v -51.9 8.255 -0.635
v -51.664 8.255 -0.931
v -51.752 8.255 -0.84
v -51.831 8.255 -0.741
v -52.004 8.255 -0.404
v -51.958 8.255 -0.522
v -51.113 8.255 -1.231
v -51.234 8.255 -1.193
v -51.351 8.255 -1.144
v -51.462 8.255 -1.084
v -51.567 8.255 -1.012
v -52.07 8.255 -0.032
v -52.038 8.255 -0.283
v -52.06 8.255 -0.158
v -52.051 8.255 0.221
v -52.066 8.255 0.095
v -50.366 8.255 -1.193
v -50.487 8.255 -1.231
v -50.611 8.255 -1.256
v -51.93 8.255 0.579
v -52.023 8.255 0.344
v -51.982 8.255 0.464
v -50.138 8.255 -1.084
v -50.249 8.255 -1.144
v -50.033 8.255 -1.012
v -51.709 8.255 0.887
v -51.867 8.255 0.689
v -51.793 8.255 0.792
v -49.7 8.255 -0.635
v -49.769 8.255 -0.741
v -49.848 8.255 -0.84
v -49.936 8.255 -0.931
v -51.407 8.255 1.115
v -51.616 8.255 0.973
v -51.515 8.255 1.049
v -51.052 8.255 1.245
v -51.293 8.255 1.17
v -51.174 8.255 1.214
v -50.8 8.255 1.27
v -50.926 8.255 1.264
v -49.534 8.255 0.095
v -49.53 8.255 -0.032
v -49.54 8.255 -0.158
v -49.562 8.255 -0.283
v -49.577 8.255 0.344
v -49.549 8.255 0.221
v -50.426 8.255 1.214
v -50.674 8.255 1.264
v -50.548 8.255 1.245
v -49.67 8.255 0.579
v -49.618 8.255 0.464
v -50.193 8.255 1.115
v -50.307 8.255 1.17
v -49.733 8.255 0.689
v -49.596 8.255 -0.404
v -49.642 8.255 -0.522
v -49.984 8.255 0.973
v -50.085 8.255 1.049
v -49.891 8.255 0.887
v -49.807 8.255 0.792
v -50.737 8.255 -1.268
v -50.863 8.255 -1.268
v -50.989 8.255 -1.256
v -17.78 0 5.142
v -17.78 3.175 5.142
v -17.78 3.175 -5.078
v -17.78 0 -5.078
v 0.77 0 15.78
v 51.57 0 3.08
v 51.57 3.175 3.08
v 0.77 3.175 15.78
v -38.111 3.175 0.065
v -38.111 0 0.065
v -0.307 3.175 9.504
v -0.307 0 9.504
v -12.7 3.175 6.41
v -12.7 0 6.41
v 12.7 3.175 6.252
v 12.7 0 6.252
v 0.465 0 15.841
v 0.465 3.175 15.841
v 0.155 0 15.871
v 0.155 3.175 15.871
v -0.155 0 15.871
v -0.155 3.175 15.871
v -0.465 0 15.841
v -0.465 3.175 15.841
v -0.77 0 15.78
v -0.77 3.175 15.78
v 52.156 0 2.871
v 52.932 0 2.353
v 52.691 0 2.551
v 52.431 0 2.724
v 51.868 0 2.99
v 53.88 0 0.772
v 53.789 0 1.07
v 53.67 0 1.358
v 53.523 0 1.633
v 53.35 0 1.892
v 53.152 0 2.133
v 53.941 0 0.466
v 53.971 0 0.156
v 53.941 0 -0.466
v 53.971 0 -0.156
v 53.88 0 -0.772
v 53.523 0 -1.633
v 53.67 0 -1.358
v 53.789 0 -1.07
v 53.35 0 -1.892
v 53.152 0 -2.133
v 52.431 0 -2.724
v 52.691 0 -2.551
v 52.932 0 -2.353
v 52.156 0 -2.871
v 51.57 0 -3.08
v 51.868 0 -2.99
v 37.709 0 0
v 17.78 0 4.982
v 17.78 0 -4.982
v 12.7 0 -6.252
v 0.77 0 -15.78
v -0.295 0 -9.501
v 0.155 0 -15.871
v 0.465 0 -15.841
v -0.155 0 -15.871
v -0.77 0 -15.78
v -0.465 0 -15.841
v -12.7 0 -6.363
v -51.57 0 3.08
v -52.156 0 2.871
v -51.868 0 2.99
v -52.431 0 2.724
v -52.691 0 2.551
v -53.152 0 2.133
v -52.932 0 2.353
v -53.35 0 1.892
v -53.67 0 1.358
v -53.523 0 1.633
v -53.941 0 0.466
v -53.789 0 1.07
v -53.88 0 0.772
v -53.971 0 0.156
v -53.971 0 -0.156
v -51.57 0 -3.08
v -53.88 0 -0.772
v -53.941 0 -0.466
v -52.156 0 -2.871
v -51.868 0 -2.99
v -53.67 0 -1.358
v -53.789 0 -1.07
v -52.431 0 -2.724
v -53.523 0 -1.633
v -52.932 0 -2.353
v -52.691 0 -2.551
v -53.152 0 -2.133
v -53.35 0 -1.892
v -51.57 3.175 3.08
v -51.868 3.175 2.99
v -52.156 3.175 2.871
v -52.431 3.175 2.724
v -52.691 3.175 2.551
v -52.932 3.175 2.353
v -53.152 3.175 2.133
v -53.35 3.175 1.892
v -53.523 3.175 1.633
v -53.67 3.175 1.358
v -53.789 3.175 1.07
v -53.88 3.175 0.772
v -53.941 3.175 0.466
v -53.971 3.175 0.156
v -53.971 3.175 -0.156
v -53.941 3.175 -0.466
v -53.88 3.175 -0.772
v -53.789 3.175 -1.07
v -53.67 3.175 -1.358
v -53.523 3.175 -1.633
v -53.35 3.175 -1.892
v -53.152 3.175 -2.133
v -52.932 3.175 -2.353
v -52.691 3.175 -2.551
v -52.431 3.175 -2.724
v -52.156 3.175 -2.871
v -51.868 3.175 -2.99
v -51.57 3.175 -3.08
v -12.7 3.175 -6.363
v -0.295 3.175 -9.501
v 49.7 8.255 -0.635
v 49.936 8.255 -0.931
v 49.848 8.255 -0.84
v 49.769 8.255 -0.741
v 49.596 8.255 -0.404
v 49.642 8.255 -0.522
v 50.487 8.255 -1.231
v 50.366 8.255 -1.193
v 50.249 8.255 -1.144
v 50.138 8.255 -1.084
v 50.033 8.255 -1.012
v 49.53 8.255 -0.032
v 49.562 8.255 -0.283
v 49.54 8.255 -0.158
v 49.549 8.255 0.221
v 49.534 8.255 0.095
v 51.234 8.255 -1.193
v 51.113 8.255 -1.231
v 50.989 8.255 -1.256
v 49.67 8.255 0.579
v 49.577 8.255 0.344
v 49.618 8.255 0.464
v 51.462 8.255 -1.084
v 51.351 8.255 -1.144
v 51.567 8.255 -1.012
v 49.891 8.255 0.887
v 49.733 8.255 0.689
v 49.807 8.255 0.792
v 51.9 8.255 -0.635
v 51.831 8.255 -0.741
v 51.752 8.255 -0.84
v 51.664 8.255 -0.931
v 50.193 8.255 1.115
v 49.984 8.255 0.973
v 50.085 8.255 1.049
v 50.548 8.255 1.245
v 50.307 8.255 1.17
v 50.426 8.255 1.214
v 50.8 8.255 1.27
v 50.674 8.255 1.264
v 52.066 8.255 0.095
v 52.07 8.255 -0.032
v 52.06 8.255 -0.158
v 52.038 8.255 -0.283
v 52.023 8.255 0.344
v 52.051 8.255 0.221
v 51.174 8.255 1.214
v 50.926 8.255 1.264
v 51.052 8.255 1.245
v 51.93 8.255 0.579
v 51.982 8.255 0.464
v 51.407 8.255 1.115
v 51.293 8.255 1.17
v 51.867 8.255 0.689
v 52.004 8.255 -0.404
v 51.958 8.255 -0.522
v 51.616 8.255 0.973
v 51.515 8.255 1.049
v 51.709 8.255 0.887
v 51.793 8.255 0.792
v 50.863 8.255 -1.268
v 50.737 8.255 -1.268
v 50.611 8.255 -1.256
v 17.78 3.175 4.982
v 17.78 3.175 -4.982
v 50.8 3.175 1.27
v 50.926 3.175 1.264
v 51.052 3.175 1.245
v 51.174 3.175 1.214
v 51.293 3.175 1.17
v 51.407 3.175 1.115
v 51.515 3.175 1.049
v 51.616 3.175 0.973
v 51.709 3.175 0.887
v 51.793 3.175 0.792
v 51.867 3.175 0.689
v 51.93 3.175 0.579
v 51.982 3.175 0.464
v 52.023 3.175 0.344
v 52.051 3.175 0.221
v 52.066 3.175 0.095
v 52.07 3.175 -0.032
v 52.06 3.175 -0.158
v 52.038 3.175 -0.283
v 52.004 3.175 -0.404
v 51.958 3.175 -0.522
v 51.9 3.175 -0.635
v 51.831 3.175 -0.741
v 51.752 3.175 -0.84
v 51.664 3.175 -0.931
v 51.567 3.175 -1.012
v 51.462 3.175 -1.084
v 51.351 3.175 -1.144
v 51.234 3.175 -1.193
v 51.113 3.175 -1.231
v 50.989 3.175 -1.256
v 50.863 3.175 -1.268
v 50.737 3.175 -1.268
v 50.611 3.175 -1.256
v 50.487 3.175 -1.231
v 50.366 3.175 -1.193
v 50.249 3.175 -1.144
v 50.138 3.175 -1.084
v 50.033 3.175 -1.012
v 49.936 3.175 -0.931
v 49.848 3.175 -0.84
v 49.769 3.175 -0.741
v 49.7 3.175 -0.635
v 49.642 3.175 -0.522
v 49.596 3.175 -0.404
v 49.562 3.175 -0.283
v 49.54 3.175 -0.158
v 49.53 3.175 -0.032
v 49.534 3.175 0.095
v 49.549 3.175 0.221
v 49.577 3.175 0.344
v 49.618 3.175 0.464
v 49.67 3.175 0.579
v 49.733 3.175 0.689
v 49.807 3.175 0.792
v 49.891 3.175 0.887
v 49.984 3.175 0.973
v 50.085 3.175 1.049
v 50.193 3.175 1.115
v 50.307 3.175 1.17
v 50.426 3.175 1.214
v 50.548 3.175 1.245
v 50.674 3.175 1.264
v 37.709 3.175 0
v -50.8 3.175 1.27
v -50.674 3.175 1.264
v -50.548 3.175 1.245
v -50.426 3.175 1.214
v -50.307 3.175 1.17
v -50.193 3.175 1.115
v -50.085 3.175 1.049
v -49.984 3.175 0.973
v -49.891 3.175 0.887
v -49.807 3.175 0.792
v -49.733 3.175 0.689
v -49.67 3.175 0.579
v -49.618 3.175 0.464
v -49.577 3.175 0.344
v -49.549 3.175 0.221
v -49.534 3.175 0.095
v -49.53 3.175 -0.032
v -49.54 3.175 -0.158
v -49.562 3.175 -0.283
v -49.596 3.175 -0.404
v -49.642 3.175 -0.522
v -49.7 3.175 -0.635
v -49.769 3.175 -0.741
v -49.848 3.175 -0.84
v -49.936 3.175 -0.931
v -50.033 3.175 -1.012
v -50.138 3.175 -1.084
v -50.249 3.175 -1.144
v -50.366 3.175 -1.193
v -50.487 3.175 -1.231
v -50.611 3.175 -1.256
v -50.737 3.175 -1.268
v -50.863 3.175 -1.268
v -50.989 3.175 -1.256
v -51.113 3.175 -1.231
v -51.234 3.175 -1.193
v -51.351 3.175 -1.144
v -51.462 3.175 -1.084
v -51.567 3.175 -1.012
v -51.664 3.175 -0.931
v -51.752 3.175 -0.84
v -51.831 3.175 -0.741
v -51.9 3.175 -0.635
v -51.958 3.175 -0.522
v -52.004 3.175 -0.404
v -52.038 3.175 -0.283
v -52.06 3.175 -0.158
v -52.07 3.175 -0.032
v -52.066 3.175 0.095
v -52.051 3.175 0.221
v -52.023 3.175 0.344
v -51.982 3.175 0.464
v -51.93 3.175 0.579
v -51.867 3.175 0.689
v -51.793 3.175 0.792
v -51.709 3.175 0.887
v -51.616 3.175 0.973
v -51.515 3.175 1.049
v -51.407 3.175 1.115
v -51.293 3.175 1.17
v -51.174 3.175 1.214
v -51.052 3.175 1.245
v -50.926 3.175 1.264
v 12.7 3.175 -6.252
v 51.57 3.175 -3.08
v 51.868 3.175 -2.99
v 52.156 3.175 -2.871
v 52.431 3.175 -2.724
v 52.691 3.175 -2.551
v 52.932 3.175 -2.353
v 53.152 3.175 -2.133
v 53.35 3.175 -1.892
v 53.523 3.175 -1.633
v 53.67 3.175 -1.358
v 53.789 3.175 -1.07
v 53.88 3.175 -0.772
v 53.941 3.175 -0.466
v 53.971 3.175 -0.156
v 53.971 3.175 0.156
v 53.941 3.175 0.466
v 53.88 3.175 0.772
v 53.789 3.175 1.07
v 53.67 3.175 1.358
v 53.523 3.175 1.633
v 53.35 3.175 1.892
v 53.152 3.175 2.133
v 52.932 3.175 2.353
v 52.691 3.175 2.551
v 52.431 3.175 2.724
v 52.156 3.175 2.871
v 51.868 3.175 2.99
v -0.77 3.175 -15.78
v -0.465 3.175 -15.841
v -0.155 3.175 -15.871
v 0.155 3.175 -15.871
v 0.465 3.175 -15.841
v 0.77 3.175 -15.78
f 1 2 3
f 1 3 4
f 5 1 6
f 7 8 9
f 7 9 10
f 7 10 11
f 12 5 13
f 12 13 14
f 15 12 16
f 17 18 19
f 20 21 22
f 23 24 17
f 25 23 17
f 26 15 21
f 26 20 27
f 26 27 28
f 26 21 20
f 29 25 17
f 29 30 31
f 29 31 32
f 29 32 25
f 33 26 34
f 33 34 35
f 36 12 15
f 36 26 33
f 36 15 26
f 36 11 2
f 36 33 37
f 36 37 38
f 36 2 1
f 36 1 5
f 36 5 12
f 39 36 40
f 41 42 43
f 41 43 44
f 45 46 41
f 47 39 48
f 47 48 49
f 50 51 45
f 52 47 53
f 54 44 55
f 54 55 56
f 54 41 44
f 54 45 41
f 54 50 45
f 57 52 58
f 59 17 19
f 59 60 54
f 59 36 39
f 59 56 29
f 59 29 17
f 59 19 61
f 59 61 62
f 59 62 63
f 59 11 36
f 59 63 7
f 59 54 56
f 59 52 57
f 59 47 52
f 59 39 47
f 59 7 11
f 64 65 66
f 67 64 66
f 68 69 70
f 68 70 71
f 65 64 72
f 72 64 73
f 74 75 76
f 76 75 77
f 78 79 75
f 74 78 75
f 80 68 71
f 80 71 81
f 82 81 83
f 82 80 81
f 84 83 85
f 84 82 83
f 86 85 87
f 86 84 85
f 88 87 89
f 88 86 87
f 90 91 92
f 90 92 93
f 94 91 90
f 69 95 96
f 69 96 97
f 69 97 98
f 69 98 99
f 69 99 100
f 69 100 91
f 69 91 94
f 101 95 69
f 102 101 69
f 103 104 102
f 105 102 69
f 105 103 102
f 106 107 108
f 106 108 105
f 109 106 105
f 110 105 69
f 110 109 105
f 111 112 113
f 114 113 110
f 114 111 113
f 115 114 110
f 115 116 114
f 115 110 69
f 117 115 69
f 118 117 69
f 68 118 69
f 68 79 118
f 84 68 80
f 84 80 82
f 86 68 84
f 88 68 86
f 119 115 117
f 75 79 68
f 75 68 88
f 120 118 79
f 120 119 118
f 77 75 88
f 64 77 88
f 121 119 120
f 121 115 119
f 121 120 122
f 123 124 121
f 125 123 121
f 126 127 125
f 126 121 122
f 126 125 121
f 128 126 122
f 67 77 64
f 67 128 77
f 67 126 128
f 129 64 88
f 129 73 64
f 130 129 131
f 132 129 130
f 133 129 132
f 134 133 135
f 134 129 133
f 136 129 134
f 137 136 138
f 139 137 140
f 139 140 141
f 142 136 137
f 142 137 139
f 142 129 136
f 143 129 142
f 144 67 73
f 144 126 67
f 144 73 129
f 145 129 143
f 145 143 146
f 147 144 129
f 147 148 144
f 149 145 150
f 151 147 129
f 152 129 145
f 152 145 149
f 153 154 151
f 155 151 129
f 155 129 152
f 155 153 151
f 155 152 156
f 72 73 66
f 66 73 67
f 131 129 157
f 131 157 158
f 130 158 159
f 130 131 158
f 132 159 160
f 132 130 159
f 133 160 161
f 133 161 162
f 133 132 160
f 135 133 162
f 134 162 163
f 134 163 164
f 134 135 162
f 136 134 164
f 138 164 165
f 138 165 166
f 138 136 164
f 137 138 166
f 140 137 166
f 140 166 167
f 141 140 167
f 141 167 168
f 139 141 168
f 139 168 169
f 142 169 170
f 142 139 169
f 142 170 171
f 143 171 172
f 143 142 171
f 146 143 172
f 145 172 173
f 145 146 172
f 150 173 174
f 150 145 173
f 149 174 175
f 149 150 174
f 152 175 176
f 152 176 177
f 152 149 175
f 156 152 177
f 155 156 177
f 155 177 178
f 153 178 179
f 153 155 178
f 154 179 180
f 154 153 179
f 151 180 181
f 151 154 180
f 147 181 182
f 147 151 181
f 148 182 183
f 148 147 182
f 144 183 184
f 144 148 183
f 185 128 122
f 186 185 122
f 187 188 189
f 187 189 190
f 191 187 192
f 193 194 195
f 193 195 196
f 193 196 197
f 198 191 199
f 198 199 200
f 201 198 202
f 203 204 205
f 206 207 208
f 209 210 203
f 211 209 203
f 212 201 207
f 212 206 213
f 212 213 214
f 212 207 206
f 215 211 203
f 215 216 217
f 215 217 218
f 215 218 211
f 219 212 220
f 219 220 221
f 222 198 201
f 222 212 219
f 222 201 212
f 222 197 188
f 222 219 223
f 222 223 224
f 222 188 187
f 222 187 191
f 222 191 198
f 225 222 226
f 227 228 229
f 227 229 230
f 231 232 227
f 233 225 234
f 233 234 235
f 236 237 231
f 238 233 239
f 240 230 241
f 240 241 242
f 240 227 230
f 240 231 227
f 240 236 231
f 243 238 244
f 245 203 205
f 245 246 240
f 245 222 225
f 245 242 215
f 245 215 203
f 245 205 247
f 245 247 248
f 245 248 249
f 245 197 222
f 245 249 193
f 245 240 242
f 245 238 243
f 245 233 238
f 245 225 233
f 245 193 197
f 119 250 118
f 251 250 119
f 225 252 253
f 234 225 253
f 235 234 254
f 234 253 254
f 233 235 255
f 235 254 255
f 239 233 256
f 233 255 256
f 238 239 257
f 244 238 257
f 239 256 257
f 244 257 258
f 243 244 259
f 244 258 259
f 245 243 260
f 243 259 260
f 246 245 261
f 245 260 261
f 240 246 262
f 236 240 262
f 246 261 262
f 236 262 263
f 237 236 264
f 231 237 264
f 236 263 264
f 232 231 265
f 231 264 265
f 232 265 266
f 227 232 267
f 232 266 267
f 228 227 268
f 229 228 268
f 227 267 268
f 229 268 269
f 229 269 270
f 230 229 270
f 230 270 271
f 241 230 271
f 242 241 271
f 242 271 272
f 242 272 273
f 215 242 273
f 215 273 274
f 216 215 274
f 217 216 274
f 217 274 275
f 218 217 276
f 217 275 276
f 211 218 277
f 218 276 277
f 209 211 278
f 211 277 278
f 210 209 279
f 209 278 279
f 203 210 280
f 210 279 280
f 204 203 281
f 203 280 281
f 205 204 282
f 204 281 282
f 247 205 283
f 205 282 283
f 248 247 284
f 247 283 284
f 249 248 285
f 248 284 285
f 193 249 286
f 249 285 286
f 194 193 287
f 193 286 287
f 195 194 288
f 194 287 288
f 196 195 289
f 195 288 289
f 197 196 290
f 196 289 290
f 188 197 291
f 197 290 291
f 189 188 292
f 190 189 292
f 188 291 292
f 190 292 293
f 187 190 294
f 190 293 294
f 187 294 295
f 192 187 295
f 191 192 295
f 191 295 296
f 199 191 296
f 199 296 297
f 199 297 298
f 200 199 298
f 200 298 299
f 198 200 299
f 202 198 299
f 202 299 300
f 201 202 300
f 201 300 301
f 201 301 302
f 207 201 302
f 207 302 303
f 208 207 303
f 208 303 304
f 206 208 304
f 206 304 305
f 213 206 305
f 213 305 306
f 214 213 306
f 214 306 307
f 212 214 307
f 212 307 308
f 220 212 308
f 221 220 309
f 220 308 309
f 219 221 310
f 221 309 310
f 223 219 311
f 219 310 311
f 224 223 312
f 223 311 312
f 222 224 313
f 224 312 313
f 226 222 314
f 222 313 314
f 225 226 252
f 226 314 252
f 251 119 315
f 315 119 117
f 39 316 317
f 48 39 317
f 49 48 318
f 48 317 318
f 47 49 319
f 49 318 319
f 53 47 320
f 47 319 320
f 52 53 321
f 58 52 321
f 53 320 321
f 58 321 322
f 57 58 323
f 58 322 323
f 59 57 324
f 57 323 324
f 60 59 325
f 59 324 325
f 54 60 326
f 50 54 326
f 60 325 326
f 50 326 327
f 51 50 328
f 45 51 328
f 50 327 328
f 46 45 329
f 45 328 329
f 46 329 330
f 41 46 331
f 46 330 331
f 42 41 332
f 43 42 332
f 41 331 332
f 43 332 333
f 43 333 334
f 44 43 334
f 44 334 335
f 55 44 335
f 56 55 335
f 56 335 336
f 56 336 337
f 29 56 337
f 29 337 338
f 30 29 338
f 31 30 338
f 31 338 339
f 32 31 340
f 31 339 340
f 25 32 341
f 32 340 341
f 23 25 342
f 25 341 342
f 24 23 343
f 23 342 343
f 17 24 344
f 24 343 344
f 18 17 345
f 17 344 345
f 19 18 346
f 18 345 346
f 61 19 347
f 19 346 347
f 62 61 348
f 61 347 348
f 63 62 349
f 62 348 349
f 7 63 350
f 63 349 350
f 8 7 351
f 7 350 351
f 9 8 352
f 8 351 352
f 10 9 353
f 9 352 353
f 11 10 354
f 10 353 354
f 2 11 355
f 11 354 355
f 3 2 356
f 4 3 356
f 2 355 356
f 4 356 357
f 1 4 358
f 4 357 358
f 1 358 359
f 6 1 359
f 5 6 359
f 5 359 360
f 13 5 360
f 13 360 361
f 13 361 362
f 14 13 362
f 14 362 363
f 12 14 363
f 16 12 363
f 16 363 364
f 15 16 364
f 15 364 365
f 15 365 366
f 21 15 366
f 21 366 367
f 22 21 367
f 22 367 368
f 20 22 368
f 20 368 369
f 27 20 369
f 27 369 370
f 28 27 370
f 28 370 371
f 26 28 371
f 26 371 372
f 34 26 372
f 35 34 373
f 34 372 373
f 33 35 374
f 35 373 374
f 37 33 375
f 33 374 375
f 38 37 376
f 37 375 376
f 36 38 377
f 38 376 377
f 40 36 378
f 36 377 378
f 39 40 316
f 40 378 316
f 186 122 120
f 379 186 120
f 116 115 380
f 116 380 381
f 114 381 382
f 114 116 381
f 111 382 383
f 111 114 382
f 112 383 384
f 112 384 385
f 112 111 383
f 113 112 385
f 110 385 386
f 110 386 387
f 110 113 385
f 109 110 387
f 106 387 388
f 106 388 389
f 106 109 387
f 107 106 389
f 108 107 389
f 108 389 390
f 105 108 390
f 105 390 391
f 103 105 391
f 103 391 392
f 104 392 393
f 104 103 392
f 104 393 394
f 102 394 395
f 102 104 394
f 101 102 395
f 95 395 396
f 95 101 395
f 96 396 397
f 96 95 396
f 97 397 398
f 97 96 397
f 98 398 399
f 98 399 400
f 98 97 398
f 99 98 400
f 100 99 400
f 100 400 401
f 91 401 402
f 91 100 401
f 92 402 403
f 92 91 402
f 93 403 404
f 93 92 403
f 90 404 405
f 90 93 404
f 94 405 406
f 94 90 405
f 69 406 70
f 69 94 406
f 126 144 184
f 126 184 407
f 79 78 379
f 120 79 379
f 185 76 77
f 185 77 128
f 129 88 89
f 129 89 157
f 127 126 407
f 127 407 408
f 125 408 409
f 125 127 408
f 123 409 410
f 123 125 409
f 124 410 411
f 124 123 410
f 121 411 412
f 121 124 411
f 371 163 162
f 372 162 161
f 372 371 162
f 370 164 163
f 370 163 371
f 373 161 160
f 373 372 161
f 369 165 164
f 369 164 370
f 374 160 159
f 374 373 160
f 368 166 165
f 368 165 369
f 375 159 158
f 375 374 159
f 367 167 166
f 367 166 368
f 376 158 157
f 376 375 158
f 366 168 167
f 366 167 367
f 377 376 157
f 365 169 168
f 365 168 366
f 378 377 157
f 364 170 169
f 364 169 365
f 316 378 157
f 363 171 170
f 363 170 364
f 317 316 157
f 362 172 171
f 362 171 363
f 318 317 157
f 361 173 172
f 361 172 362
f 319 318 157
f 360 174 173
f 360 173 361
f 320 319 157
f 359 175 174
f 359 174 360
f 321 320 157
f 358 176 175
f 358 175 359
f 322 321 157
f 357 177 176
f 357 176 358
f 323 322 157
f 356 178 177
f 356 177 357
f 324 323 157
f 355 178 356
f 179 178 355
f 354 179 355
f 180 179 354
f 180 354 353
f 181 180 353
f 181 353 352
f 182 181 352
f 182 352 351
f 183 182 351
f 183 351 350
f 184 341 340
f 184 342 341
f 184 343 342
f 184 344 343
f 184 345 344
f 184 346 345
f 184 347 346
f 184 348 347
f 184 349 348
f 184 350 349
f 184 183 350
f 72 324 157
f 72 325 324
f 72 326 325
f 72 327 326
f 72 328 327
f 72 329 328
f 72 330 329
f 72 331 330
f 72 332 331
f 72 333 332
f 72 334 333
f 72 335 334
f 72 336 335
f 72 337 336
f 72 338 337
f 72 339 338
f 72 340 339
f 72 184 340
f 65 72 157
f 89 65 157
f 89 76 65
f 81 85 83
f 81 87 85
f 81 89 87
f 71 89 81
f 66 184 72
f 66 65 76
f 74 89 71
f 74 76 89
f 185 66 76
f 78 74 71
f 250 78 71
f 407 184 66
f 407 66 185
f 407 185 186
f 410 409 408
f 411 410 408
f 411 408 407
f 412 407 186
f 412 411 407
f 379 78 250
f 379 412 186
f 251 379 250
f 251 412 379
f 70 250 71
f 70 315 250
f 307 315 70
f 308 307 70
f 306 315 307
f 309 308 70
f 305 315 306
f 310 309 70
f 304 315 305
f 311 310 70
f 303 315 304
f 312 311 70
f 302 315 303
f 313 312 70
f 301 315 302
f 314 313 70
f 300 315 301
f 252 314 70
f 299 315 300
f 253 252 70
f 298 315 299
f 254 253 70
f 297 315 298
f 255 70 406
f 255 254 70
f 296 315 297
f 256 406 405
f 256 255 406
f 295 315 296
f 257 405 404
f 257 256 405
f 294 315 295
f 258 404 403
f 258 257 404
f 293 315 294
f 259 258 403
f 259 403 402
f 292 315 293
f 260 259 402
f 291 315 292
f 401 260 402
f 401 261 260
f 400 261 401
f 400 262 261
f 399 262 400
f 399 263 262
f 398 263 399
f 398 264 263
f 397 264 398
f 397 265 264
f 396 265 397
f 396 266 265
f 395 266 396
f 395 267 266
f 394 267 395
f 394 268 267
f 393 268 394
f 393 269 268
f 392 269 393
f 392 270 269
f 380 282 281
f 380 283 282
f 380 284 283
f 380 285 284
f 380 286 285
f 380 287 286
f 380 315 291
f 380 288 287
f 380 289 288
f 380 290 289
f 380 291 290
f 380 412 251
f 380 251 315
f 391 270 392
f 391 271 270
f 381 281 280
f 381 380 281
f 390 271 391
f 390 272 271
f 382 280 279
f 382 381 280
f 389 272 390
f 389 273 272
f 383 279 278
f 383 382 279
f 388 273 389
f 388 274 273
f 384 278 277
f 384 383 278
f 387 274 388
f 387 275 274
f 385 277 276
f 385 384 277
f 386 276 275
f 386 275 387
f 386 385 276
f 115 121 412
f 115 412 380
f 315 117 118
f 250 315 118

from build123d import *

# Parameters (mm, degrees)
BOSS_EXTRUDE1_DEPTH = 3.175
SKETCH5_R           = 1.27
BOSS_EXTRUDE2_DEPTH = 5.08
SKETCH6_R           = 1.27
BOSS_EXTRUDE3_DEPTH = 5.08
SKETCH10_W          = 5.08
SKETCH10_H          = 16.51
BOSS_EXTRUDE6_DEPTH = 3.175


with BuildPart() as part:
    # Sketch2 → Boss-Extrude1 (new body)
    with BuildSketch(Plane(origin=(0, 0, 0), x_dir=(1, 0, 0), z_dir=(0, 1, 0))):
        with BuildLine():
            Line((-51.57005061, 3.080202438), (-0.770050609, 15.780202438))
            ThreePointArc((-0.770050609, 15.780202438), (0, 15.875), (0.770050609, 15.780202438))
            Line((0.770050609, 15.780202438), (51.57005061, 3.080202438))
            ThreePointArc((51.57005061, 3.080202438), (53.975, 0), (51.57005061, -3.080202438))
            Line((51.57005061, -3.080202438), (0.770050609, -15.780202438))
            ThreePointArc((0.770050609, -15.780202438), (0, -15.875), (-0.770050609, -15.780202438))
            Line((-0.770050609, -15.780202438), (-51.57005061, -3.080202438))
            ThreePointArc((-51.57005061, -3.080202438), (-53.975, 0), (-51.57005061, 3.080202438))
        make_face()
        Polygon((37.709139639, 0), (-0.307385689, -9.504131332), (-38.111149392, -0.065221488), (-0.294525174, 9.500916203), align=None, mode=Mode.SUBTRACT)
    extrude(amount=BOSS_EXTRUDE1_DEPTH)

    # Sketch5 → Boss-Extrude2 (add)
    with BuildSketch(Plane(origin=(0, 3.175, 0), x_dir=(1, 0, 0), z_dir=(0, 1, 0))):
        with Locations(Location((-50.8, 0, 0), (0, 0, 270))):
            Circle(SKETCH5_R)
    extrude(amount=BOSS_EXTRUDE2_DEPTH)

    # Sketch6 → Boss-Extrude3 (add)
    with BuildSketch(Plane(origin=(0, 3.175, 0), x_dir=(1, 0, 0), z_dir=(0, 1, 0))):
        with Locations(Location((50.8, 0, 0), (0, 0, 270))):
            Circle(SKETCH6_R)
    extrude(amount=BOSS_EXTRUDE3_DEPTH)

    # Sketch10 → Boss-Extrude6 (add)
    with BuildSketch(Plane(origin=(0, 3.175, 0), x_dir=(1, 0, 0), z_dir=(0, 1, 0))):
        with Locations((-15.24, 0)):
            Rectangle(SKETCH10_W, SKETCH10_H)
        with Locations((15.24, 0)):
            Rectangle(SKETCH10_W, SKETCH10_H)
    extrude(amount=-BOSS_EXTRUDE6_DEPTH)


solid = part.part
